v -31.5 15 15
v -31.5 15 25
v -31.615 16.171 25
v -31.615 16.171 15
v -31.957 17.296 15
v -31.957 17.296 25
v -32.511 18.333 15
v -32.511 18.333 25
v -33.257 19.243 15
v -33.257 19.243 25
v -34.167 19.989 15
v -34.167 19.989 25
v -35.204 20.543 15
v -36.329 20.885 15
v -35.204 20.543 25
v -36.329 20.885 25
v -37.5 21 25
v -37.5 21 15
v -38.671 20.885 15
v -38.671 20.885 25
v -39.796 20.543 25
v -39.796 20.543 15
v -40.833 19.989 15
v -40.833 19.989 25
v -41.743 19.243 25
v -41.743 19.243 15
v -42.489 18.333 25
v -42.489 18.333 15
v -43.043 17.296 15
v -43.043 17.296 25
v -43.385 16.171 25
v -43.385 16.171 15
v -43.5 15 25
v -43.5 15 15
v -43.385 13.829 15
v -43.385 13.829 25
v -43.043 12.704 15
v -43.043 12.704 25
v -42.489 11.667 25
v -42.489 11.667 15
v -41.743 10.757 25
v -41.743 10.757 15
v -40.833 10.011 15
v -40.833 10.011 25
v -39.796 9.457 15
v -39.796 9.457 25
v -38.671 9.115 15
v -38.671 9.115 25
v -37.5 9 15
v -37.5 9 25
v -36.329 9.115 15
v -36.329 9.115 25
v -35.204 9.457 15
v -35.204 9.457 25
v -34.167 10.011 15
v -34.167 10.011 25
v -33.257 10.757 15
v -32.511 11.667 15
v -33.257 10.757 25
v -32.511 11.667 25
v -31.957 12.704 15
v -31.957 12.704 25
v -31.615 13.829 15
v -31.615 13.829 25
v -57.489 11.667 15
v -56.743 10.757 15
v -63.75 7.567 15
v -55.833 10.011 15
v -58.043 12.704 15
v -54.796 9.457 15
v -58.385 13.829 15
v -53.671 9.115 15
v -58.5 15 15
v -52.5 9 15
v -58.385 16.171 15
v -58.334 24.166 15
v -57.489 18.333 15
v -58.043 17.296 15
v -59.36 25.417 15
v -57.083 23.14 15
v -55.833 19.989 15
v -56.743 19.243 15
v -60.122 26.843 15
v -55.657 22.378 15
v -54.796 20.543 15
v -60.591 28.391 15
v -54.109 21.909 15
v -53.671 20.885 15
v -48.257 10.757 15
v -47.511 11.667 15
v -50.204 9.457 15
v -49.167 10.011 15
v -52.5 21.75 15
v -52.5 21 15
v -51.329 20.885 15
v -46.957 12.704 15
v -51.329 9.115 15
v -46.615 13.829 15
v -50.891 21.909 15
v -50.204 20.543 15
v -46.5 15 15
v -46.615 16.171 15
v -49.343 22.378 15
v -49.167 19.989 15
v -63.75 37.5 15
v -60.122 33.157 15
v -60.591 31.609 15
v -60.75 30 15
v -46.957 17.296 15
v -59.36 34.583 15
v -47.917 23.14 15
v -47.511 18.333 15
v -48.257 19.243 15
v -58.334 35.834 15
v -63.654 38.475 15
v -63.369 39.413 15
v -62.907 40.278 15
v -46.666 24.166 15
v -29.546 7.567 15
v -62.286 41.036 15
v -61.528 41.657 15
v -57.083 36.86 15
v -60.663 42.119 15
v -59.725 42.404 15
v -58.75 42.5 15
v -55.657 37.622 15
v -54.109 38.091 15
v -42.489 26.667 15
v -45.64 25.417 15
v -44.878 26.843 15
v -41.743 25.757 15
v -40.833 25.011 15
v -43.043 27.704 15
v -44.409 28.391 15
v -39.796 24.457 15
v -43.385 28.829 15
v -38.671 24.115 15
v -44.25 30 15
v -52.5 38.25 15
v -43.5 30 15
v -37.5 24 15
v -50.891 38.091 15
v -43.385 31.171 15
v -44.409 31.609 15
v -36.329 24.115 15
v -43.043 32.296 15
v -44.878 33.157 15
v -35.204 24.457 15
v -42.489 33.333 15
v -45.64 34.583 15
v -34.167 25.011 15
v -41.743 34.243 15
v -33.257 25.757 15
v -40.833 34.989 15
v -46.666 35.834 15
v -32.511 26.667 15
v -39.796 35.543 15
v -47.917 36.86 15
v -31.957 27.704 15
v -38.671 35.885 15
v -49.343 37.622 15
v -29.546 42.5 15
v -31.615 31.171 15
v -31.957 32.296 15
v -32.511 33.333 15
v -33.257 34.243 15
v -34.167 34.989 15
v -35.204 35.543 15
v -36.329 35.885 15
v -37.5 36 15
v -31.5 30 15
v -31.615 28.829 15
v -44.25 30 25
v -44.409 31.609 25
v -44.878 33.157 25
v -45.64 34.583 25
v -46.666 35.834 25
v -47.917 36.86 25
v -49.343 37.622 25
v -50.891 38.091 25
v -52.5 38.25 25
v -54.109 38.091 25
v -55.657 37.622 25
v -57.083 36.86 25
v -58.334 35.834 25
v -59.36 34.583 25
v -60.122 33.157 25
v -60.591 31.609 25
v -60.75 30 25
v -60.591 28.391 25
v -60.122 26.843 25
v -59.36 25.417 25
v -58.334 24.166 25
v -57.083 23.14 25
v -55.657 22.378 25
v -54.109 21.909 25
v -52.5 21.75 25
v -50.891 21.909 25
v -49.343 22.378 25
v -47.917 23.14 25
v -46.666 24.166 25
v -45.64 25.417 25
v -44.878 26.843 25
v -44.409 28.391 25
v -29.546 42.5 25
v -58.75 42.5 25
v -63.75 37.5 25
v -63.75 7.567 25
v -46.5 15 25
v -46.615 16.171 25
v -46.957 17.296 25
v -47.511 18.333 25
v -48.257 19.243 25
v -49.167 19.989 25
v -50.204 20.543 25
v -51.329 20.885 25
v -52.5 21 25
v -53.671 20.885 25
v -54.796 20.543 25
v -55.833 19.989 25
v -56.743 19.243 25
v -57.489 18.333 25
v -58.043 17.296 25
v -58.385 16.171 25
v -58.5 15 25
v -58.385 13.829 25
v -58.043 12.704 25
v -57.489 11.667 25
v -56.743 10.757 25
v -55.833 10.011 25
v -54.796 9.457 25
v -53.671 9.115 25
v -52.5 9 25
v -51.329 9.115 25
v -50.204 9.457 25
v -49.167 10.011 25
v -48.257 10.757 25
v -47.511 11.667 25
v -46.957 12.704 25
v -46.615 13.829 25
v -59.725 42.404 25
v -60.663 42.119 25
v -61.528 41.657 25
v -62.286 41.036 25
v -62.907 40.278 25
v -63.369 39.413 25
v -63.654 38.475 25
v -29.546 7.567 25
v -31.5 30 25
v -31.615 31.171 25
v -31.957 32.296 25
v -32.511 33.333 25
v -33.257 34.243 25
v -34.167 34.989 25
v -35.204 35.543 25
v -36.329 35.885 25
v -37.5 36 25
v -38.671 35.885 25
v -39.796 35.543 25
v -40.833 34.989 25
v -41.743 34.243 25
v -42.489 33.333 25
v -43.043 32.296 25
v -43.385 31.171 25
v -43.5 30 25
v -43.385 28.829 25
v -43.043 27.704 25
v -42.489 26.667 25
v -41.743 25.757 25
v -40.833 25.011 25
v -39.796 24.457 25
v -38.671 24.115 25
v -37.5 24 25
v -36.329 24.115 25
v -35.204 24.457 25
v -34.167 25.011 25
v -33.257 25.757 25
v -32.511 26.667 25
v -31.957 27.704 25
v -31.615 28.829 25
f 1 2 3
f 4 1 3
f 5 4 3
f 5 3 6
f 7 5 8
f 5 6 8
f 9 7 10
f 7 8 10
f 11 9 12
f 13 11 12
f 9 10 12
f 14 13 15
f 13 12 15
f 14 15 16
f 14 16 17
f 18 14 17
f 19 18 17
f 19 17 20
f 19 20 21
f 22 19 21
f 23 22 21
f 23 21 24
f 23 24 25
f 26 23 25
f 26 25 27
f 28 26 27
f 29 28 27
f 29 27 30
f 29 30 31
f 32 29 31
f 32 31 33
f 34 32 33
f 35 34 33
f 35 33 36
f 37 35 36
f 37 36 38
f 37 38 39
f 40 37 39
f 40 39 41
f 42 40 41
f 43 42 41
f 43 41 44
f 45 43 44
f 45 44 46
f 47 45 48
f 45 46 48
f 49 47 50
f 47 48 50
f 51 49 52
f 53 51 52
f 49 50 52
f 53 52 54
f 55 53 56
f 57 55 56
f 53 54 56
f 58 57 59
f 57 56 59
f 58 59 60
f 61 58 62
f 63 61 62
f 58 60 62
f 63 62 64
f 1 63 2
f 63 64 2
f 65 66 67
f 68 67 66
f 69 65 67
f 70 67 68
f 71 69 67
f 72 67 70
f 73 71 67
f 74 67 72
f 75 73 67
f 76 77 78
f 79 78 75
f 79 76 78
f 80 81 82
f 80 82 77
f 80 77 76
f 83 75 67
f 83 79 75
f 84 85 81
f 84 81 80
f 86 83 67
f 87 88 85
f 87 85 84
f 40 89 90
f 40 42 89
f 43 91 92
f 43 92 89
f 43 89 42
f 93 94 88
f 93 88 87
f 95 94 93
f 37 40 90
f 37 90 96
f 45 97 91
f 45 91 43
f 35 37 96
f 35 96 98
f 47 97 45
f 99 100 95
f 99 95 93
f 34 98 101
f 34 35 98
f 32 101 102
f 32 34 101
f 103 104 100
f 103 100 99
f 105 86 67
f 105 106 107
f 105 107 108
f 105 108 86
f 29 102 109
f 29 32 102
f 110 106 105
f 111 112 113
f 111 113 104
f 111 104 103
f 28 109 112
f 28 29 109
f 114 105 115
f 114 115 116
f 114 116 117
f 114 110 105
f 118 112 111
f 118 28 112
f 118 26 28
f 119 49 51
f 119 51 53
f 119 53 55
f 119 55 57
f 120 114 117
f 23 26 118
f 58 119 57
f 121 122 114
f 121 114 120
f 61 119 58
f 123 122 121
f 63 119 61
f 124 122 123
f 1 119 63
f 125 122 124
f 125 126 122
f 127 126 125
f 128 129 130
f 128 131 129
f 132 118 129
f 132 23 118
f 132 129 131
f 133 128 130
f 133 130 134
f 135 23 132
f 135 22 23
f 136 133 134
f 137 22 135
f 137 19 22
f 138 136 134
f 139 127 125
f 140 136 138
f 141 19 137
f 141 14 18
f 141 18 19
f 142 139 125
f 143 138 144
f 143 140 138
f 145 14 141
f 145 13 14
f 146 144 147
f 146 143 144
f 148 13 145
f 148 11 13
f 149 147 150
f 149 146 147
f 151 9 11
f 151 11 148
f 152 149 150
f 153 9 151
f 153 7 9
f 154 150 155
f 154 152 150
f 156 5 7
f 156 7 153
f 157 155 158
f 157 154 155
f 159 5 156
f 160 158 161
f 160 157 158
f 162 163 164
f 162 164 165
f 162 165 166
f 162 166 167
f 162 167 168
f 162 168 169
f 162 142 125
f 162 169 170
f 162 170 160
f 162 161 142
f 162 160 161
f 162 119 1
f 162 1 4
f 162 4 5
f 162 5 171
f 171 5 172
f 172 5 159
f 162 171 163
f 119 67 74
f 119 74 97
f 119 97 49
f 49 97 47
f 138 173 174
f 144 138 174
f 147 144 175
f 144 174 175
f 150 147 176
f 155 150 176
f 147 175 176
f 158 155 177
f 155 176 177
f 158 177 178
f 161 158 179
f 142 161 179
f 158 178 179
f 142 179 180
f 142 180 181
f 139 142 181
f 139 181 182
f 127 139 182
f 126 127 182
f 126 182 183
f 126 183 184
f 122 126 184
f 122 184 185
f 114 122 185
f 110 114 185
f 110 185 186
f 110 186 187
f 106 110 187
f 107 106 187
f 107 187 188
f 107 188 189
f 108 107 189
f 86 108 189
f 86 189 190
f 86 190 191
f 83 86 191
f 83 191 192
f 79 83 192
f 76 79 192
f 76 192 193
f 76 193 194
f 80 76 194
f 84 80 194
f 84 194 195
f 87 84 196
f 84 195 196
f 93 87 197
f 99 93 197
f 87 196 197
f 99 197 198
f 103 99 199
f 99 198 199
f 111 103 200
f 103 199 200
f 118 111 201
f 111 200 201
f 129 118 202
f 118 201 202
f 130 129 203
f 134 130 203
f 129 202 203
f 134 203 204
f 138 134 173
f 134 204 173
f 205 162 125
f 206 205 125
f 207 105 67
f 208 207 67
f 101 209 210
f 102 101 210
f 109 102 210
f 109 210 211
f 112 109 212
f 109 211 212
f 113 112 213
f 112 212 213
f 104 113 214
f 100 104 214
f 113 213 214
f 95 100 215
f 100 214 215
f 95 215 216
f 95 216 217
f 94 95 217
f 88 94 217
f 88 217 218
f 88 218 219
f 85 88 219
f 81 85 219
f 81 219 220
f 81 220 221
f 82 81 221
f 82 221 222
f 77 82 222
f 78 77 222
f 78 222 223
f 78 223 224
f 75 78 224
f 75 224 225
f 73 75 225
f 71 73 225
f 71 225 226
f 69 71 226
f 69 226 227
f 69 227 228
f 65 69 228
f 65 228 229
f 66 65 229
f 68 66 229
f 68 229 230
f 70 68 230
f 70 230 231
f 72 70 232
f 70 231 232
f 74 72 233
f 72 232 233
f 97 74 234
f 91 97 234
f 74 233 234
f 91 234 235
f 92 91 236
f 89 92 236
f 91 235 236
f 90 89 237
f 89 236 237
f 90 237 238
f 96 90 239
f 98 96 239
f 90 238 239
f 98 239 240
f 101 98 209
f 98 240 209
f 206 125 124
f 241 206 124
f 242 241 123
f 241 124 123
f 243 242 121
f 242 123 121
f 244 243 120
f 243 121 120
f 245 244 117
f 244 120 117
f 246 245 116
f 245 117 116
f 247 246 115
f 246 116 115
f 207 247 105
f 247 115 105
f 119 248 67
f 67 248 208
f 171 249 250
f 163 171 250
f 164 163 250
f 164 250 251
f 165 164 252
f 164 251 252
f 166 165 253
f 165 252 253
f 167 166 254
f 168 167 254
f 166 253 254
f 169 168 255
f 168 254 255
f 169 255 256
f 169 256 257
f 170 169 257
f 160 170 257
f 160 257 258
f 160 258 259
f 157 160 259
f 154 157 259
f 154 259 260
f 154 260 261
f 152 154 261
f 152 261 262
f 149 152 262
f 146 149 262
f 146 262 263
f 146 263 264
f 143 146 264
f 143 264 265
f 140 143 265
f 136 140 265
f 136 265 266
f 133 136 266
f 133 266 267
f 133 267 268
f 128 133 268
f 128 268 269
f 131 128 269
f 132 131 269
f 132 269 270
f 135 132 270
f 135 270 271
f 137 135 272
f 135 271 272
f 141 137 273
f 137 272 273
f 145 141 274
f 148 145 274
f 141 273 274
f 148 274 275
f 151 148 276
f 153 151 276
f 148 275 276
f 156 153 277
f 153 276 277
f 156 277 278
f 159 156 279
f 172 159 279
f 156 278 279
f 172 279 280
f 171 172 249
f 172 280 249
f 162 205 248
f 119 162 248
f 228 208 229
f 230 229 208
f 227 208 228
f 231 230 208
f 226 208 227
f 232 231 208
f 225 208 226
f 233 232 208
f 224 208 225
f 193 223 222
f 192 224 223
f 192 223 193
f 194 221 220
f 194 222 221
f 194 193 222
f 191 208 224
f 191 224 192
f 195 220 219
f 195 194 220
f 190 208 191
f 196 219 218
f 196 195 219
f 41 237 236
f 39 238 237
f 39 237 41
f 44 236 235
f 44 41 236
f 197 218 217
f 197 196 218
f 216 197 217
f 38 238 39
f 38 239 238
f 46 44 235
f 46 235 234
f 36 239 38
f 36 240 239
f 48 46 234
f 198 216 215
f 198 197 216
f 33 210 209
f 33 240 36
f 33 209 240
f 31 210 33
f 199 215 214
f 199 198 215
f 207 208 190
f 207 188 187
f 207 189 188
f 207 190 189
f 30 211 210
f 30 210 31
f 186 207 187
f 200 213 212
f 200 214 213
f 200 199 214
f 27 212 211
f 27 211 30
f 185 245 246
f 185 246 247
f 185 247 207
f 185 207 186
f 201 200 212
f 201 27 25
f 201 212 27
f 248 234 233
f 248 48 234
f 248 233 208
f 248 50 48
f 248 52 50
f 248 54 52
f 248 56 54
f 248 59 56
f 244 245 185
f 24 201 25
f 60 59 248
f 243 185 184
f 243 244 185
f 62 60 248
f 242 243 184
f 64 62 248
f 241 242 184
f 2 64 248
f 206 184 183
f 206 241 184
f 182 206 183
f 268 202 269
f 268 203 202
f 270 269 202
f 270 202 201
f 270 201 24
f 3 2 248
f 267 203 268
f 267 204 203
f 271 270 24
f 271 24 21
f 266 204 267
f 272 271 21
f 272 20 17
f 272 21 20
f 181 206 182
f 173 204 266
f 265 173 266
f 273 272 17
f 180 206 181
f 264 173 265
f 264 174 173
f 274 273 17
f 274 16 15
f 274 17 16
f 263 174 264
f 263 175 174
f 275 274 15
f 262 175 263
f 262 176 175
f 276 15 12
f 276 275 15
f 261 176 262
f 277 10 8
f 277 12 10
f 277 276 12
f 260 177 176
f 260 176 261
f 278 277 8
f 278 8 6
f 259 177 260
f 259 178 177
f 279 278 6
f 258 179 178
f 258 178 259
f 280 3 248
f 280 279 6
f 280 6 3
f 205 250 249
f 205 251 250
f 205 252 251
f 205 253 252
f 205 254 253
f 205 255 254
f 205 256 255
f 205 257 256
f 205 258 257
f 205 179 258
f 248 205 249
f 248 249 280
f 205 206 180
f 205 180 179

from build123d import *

# Parameters (mm, degrees)
F1_DEPTH = 25
F2_R     = 6
F2_R_2   = 8.25
F2_R_3   = 8
F3_DEPTH = 20
F5_DEPTH = 25.001
F6_W     = 34.932942614
F6_H     = 15
F7_DEPTH = 34.2048565129


with BuildPart() as f1:
    # F0 (on Top) → F1 (new body)
    with BuildSketch(Plane.XY):
        with BuildLine():
            Line((-58.75, -42.5), (58.75, -42.5))
            ThreePointArc((58.75, -42.5), (62.2855339059, -41.0355339059), (63.75, -37.5))
            Line((63.75, -37.5), (63.75, 37.5))
            ThreePointArc((63.75, 37.5), (62.2855339059, 41.0355339059), (58.75, 42.5))
            Line((58.75, 42.5), (-58.75, 42.5))
            ThreePointArc((-58.75, 42.5), (-62.2855339059, 41.0355339059), (-63.75, 37.5))
            Line((-63.75, 37.5), (-63.75, -37.5))
            ThreePointArc((-63.75, -37.5), (-62.2855339059, -41.0355339059), (-58.75, -42.5))
        make_face()
    extrude(amount=F1_DEPTH)

    # F2 (on face) → F3 (cut)
    with BuildSketch(Plane.XY.offset(25)):
        with Locations((-52.5, 15)):
            Circle(F2_R)
        with Locations((-52.5, 0)):
            Circle(F2_R)
        with Locations((-52.5, -15)):
            Circle(F2_R)
        with Locations((-37.5, 30)):
            Circle(F2_R)
        with Locations((-37.5, 15)):
            Circle(F2_R)
        with Locations((-37.5, 0)):
            Circle(F2_R)
        with Locations((-37.5, -15)):
            Circle(F2_R)
        with Locations((-37.5, -30)):
            Circle(F2_R)
        with Locations((-22.5, 30)):
            Circle(F2_R)
        with Locations((-22.5, 15)):
            Circle(F2_R)
        with Locations((-22.5, 0)):
            Circle(F2_R)
        with Locations((-22.5, -15)):
            Circle(F2_R)
        with Locations((-22.5, -30)):
            Circle(F2_R)
        with Locations((-7.5, 30)):
            Circle(F2_R)
        with Locations((-7.5, 15)):
            Circle(F2_R)
        with Locations((-7.5, 0)):
            Circle(F2_R)
        with Locations((-7.5, -15)):
            Circle(F2_R)
        with Locations((-7.5, -30)):
            Circle(F2_R)
        with Locations((7.5, 30)):
            Circle(F2_R)
        with Locations((7.5, 15)):
            Circle(F2_R)
        with Locations((7.5, 0)):
            Circle(F2_R)
        with Locations((7.5, -15)):
            Circle(F2_R)
        with Locations((7.5, -30)):
            Circle(F2_R)
        with Locations((22.5, 30)):
            Circle(F2_R)
        with Locations((22.5, 15)):
            Circle(F2_R)
        with Locations((22.5, 0)):
            Circle(F2_R)
        with Locations((22.5, -15)):
            Circle(F2_R)
        with Locations((22.5, -30)):
            Circle(F2_R)
        with Locations((37.5, 30)):
            Circle(F2_R)
        with Locations((37.5, 15)):
            Circle(F2_R)
        with Locations((37.5, 0)):
            Circle(F2_R)
        with Locations((37.5, -15)):
            Circle(F2_R)
        with Locations((37.5, -30)):
            Circle(F2_R)
        with Locations((52.5, 15)):
            Circle(F2_R)
        with Locations((52.5, 0)):
            Circle(F2_R)
        with Locations((52.5, -15)):
            Circle(F2_R)
        with Locations((-52.5, 30)):
            Circle(F2_R_2)
        with Locations((-52.5, -30)):
            Circle(F2_R_3)
        with Locations((52.5, 30)):
            Circle(F2_R_3)
        with Locations((52.5, -30)):
            Circle(F2_R_3)
    extrude(amount=-F3_DEPTH, mode=Mode.SUBTRACT)

    # F4 (on face) → F5 (cut, through all)
    with BuildSketch(Plane.XY.offset(25)):
        Polygon((69.5764049888, -59.449698776), (69.5764049888, 48.7273074687), (-29.5461434871, 48.7273074687), (-29.5461434871, 7.567057386), (-74.2632374167, 7.567057386), (-74.2632374167, 4.9460288137), (-74.2632374167, -59.449698776), align=None)
    extrude(amount=-F5_DEPTH, mode=Mode.SUBTRACT)

    # F6 (on face) → F7 (cut, through all)
    with BuildSketch(Plane.YZ.offset(-29.5461434871)):
        with Locations((25.033528693, 7.5)):
            Rectangle(F6_W, F6_H)
    extrude(amount=-F7_DEPTH, mode=Mode.SUBTRACT)


solid = f1.part
